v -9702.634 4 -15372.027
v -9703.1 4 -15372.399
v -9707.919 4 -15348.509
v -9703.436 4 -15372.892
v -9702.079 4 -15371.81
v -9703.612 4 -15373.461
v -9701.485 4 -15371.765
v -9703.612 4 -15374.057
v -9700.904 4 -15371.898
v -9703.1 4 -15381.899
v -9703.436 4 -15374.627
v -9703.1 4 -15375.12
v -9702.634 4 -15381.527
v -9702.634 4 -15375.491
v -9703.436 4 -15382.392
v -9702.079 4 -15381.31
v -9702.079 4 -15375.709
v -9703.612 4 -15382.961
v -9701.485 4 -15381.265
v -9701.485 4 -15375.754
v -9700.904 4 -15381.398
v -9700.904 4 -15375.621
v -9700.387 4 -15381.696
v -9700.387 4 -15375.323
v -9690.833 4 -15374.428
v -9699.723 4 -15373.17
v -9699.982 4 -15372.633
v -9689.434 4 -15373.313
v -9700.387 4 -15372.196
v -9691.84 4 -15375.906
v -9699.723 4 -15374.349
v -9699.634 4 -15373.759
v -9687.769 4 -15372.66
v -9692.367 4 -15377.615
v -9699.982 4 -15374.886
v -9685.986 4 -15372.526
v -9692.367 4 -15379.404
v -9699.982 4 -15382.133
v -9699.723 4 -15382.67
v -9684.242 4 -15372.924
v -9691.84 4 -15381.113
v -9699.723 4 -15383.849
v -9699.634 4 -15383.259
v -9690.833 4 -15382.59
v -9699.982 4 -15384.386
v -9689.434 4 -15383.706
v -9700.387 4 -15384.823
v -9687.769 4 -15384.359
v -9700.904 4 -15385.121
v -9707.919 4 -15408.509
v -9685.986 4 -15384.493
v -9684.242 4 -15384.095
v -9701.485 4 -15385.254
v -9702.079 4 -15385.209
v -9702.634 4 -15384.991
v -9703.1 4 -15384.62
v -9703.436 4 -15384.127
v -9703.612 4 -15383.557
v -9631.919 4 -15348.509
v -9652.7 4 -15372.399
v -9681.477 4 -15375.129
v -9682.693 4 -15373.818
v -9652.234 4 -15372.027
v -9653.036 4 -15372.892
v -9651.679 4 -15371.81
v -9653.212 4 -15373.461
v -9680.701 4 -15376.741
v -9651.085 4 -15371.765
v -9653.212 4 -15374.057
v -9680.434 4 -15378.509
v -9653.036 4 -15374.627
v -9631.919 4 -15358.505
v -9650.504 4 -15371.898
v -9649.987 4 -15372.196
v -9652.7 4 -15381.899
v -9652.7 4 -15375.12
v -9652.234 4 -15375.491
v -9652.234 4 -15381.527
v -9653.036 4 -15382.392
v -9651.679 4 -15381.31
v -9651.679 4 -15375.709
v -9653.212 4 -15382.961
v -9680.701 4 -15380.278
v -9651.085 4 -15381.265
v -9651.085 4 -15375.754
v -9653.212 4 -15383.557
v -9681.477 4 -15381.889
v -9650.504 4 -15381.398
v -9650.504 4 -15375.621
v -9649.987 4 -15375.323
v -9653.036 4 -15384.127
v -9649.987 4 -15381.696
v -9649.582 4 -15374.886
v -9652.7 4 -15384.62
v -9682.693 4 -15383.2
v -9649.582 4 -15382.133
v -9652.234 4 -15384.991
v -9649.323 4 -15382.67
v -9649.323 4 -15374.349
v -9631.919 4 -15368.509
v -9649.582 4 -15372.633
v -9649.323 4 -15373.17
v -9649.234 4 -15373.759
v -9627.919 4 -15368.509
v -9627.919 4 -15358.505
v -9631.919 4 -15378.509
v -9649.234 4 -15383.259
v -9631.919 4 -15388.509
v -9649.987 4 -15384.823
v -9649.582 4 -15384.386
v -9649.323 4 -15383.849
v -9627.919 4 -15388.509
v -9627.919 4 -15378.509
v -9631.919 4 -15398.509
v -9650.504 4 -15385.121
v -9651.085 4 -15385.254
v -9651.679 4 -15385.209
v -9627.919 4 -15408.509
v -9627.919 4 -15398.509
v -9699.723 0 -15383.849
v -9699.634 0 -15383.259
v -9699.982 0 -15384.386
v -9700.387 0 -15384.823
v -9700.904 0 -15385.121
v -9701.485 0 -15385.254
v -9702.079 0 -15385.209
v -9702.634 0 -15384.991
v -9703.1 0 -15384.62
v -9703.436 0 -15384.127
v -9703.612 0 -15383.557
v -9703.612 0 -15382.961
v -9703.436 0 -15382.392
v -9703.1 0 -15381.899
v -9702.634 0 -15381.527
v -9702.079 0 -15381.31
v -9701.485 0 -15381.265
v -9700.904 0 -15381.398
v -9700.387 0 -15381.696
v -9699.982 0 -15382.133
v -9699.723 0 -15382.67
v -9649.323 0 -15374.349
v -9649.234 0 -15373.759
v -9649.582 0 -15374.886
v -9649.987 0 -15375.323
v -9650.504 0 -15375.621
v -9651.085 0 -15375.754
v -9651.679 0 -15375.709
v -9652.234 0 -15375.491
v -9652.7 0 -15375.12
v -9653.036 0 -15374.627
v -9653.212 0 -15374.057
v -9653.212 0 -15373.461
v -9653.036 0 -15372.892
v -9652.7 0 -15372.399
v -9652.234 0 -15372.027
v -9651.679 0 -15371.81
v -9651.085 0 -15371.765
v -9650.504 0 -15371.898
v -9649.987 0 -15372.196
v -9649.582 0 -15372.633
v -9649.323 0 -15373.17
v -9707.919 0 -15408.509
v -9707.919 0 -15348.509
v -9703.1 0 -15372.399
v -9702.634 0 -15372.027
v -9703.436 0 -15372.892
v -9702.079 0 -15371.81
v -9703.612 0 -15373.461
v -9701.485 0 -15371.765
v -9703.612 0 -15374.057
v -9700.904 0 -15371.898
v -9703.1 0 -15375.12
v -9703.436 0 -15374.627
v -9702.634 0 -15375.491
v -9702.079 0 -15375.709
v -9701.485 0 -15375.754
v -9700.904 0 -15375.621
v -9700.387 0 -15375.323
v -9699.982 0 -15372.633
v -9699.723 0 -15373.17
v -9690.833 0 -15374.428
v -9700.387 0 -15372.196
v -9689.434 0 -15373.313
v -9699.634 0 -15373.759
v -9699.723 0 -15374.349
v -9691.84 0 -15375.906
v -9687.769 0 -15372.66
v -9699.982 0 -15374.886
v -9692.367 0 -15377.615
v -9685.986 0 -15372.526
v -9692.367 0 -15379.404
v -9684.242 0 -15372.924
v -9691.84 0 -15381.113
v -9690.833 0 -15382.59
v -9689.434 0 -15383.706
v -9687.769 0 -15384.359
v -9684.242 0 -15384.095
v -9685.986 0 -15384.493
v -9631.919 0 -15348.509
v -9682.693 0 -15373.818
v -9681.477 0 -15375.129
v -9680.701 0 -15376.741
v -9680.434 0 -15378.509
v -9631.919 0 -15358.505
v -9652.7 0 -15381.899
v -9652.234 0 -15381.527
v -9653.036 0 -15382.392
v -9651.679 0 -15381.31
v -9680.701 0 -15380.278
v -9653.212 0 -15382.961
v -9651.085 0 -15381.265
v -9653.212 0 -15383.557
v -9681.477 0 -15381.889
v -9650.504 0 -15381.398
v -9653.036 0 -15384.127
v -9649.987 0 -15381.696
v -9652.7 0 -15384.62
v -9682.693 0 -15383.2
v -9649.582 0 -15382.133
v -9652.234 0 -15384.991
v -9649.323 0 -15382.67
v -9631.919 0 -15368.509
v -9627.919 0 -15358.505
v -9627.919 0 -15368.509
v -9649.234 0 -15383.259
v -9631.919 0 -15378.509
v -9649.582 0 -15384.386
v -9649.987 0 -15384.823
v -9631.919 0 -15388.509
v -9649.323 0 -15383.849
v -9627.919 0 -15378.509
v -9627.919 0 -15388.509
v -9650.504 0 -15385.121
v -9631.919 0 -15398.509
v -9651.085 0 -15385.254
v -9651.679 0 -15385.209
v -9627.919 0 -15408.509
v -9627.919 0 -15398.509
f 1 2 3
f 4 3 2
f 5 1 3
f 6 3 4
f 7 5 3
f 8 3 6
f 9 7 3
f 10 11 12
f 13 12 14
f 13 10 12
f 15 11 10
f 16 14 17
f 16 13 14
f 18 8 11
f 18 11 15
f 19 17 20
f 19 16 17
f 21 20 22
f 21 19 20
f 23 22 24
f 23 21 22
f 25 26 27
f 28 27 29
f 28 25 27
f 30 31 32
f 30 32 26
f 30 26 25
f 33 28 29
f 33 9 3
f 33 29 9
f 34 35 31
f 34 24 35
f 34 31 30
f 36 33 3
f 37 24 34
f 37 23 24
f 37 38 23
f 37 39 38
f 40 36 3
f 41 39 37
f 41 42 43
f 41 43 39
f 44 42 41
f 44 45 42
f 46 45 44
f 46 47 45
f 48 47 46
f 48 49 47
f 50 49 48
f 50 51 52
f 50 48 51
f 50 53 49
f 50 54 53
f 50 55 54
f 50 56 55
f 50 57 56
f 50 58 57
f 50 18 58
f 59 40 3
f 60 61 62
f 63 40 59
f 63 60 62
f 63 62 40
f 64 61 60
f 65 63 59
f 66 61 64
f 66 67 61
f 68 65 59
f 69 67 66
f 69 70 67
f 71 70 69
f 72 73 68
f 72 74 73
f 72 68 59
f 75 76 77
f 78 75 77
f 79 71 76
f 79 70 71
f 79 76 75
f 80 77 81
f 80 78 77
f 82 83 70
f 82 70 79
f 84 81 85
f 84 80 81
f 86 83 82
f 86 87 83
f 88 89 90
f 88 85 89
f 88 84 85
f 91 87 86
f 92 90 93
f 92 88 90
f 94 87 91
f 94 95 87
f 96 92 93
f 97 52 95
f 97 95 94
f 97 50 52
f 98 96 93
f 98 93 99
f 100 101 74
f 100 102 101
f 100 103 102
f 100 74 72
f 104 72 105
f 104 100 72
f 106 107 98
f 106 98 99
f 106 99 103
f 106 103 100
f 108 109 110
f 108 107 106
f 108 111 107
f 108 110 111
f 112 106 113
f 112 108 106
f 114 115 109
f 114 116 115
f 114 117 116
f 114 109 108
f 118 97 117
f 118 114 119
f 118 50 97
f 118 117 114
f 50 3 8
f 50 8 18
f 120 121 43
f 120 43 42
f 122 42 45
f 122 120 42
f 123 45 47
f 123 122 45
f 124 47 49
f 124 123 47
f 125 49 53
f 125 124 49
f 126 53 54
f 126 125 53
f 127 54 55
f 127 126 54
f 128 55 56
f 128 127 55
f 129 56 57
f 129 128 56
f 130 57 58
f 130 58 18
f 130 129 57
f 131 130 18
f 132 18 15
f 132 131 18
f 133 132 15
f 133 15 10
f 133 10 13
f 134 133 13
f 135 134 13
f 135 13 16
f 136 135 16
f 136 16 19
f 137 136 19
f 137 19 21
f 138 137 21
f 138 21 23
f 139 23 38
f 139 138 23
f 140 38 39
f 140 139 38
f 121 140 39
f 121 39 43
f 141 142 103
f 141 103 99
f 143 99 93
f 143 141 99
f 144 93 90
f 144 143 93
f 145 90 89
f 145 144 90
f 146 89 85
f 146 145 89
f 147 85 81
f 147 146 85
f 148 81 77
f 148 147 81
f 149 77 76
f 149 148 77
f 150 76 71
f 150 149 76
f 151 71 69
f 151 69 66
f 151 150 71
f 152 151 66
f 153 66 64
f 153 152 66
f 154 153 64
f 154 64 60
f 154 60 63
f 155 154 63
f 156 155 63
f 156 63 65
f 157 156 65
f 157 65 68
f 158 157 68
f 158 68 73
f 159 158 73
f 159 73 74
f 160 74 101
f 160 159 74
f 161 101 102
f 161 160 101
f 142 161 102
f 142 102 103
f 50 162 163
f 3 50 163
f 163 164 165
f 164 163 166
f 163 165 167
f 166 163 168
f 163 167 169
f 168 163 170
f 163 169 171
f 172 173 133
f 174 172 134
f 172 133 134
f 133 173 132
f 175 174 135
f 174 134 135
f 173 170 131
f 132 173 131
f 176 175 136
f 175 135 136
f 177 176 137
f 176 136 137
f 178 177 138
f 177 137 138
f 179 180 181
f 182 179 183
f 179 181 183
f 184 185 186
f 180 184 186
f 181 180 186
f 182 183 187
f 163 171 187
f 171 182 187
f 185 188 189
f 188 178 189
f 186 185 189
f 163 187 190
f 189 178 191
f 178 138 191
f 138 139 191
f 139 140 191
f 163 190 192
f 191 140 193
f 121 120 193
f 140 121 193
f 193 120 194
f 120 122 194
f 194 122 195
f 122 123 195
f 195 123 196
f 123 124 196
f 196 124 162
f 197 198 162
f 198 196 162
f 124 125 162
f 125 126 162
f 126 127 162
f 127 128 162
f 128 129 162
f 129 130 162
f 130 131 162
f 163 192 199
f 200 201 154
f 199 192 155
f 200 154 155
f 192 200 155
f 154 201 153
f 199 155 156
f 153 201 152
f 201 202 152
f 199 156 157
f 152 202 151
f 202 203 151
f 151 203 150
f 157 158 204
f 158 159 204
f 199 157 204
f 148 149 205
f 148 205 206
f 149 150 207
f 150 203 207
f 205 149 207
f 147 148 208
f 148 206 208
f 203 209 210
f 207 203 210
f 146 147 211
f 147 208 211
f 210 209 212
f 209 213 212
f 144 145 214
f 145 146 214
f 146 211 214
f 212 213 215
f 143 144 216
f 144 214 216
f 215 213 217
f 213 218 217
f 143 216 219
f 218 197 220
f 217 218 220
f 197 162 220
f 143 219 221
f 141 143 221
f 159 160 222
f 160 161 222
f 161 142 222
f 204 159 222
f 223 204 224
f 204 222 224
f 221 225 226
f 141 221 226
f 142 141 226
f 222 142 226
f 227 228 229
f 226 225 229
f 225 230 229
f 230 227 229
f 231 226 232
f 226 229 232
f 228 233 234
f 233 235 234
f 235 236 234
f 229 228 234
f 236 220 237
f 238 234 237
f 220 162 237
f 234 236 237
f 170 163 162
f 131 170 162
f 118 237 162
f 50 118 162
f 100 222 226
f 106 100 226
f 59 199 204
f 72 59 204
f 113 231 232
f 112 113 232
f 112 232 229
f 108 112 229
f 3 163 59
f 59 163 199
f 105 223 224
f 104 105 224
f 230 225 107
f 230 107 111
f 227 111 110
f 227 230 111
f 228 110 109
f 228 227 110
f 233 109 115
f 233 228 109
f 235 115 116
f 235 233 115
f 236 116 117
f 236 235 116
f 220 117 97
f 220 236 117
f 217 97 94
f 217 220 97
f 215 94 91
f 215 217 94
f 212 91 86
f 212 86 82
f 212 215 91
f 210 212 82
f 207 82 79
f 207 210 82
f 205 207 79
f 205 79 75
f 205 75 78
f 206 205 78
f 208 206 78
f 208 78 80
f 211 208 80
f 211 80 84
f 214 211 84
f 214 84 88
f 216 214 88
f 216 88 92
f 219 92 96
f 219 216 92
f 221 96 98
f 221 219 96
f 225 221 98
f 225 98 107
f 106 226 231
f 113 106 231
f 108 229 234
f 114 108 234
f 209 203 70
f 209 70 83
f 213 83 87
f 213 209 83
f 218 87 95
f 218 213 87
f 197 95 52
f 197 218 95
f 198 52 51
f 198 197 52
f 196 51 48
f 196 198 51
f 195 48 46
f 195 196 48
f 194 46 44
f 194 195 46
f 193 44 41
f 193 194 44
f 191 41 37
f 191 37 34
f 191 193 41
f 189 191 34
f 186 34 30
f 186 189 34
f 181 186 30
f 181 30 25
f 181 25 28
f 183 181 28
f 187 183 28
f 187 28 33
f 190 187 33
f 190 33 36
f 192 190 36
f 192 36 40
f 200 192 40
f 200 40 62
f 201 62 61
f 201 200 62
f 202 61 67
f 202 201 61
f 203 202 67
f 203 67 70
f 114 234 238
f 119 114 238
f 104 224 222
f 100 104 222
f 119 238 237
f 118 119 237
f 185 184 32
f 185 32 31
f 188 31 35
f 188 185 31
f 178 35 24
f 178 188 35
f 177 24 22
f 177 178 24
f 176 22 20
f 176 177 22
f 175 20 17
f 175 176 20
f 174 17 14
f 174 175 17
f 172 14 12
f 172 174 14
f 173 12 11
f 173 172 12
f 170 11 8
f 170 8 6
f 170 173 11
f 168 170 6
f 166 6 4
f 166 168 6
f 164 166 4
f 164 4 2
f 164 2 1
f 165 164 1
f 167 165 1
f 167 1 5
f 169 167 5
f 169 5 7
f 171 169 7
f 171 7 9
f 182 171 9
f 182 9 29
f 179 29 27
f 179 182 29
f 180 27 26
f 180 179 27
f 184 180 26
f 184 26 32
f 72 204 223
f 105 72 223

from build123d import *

# Parameters (mm, degrees)
SKETCH1_R           = 6
SKETCH1_R_2         = 2
BOSS_EXTRUDE1_DEPTH = 4


with BuildPart() as part:
    # Sketch1 → Boss-Extrude1 (new body)
    with BuildSketch(Plane(origin=(0, 0, 0), x_dir=(1, 0, 0), z_dir=(0, 1, 0))):
        Polygon((-9707.918733038, 15348.509362373), (-9631.918733038, 15348.509362373), (-9631.918733038, 15358.505402083), (-9627.918733038, 15358.505402083), (-9627.918733038, 15368.509362373), (-9631.918733038, 15368.509362373), (-9631.918733038, 15378.509362373), (-9627.918733038, 15378.509362373), (-9627.918733038, 15388.509362373), (-9631.918733038, 15388.509362373), (-9631.918733038, 15398.509362373), (-9627.918733038, 15398.509362373), (-9627.918733038, 15408.509362373), (-9707.918733038, 15408.509362373), align=None)
        with Locations((-9686.434317231, 15378.509362373)):
            Circle(SKETCH1_R, mode=Mode.SUBTRACT)
        with Locations((-9651.234317231, 15383.259362373)):
            Circle(SKETCH1_R_2, mode=Mode.SUBTRACT)
        with Locations((-9651.234317231, 15373.759362373)):
            Circle(SKETCH1_R_2, mode=Mode.SUBTRACT)
        with Locations((-9701.634317231, 15373.759362373)):
            Circle(SKETCH1_R_2, mode=Mode.SUBTRACT)
        with Locations((-9701.634317231, 15383.259362373)):
            Circle(SKETCH1_R_2, mode=Mode.SUBTRACT)
    extrude(amount=BOSS_EXTRUDE1_DEPTH)


solid = part.part
